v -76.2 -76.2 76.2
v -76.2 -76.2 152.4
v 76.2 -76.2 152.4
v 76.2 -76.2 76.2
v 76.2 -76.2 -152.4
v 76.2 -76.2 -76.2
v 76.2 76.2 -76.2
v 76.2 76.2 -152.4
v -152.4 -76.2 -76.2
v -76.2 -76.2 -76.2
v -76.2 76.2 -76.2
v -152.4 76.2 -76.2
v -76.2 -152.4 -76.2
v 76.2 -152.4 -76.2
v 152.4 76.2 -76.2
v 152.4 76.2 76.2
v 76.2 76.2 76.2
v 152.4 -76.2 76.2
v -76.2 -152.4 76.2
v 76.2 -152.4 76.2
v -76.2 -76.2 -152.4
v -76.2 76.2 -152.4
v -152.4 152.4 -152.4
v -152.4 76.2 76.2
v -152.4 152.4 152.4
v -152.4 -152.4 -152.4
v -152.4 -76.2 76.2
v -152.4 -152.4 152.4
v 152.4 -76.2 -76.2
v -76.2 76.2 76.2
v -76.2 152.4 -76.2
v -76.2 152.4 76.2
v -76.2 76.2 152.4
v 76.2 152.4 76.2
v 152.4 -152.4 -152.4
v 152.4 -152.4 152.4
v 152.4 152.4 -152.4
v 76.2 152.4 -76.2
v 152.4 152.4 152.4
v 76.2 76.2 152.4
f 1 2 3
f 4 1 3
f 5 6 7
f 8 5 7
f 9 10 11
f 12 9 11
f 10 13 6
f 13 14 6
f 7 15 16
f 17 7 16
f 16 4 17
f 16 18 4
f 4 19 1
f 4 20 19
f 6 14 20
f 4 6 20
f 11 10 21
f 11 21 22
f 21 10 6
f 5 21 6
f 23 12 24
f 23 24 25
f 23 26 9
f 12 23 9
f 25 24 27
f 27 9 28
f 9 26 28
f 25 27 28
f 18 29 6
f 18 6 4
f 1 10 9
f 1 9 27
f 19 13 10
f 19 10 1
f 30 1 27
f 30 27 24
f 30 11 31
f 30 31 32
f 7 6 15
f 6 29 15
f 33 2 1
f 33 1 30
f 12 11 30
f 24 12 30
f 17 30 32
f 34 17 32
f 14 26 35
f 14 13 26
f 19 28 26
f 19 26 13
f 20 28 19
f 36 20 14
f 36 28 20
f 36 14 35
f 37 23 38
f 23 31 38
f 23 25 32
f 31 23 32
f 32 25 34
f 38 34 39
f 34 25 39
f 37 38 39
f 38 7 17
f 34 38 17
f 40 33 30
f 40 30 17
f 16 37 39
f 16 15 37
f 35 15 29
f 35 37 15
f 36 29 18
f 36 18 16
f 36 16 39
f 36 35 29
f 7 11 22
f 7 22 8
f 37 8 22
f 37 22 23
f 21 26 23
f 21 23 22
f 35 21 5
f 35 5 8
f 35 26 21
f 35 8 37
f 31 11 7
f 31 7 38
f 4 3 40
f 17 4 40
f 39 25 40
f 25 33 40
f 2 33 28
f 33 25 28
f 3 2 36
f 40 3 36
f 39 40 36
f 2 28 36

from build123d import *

# Parameters (mm, degrees)
F0_W     = 304.8
F0_H     = 304.8
F1_DEPTH = 152.4
F2_W     = 152.4
F2_H     = 152.4
F3_DEPTH = 304.801
F4_W     = 152.4
F4_H     = 152.4
F5_DEPTH = 304.801
F6_W     = 152.4
F6_H     = 152.4
F7_DEPTH = 304.801


with BuildPart() as f1:
    # F0 (on Front) → F1 (new body, symmetric)
    with BuildSketch(Plane.XZ):
        Rectangle(F0_W, F0_H)
    extrude(amount=F1_DEPTH, both=True)

    # F2 (on face) → F3 (cut, through all)
    with BuildSketch(Plane.YZ.offset(152.4)):
        Rectangle(F2_W, F2_H)
    extrude(amount=-F3_DEPTH, mode=Mode.SUBTRACT)

    # F4 (on face) → F5 (cut, through all)
    with BuildSketch(Plane.XZ.offset(152.4)):
        Rectangle(F4_W, F4_H)
    extrude(amount=-F5_DEPTH, mode=Mode.SUBTRACT)

    # F6 (on face) → F7 (cut, through all)
    with BuildSketch(Plane.XY.offset(152.4)):
        Rectangle(F6_W, F6_H)
    extrude(amount=-F7_DEPTH, mode=Mode.SUBTRACT)


solid = f1.part
